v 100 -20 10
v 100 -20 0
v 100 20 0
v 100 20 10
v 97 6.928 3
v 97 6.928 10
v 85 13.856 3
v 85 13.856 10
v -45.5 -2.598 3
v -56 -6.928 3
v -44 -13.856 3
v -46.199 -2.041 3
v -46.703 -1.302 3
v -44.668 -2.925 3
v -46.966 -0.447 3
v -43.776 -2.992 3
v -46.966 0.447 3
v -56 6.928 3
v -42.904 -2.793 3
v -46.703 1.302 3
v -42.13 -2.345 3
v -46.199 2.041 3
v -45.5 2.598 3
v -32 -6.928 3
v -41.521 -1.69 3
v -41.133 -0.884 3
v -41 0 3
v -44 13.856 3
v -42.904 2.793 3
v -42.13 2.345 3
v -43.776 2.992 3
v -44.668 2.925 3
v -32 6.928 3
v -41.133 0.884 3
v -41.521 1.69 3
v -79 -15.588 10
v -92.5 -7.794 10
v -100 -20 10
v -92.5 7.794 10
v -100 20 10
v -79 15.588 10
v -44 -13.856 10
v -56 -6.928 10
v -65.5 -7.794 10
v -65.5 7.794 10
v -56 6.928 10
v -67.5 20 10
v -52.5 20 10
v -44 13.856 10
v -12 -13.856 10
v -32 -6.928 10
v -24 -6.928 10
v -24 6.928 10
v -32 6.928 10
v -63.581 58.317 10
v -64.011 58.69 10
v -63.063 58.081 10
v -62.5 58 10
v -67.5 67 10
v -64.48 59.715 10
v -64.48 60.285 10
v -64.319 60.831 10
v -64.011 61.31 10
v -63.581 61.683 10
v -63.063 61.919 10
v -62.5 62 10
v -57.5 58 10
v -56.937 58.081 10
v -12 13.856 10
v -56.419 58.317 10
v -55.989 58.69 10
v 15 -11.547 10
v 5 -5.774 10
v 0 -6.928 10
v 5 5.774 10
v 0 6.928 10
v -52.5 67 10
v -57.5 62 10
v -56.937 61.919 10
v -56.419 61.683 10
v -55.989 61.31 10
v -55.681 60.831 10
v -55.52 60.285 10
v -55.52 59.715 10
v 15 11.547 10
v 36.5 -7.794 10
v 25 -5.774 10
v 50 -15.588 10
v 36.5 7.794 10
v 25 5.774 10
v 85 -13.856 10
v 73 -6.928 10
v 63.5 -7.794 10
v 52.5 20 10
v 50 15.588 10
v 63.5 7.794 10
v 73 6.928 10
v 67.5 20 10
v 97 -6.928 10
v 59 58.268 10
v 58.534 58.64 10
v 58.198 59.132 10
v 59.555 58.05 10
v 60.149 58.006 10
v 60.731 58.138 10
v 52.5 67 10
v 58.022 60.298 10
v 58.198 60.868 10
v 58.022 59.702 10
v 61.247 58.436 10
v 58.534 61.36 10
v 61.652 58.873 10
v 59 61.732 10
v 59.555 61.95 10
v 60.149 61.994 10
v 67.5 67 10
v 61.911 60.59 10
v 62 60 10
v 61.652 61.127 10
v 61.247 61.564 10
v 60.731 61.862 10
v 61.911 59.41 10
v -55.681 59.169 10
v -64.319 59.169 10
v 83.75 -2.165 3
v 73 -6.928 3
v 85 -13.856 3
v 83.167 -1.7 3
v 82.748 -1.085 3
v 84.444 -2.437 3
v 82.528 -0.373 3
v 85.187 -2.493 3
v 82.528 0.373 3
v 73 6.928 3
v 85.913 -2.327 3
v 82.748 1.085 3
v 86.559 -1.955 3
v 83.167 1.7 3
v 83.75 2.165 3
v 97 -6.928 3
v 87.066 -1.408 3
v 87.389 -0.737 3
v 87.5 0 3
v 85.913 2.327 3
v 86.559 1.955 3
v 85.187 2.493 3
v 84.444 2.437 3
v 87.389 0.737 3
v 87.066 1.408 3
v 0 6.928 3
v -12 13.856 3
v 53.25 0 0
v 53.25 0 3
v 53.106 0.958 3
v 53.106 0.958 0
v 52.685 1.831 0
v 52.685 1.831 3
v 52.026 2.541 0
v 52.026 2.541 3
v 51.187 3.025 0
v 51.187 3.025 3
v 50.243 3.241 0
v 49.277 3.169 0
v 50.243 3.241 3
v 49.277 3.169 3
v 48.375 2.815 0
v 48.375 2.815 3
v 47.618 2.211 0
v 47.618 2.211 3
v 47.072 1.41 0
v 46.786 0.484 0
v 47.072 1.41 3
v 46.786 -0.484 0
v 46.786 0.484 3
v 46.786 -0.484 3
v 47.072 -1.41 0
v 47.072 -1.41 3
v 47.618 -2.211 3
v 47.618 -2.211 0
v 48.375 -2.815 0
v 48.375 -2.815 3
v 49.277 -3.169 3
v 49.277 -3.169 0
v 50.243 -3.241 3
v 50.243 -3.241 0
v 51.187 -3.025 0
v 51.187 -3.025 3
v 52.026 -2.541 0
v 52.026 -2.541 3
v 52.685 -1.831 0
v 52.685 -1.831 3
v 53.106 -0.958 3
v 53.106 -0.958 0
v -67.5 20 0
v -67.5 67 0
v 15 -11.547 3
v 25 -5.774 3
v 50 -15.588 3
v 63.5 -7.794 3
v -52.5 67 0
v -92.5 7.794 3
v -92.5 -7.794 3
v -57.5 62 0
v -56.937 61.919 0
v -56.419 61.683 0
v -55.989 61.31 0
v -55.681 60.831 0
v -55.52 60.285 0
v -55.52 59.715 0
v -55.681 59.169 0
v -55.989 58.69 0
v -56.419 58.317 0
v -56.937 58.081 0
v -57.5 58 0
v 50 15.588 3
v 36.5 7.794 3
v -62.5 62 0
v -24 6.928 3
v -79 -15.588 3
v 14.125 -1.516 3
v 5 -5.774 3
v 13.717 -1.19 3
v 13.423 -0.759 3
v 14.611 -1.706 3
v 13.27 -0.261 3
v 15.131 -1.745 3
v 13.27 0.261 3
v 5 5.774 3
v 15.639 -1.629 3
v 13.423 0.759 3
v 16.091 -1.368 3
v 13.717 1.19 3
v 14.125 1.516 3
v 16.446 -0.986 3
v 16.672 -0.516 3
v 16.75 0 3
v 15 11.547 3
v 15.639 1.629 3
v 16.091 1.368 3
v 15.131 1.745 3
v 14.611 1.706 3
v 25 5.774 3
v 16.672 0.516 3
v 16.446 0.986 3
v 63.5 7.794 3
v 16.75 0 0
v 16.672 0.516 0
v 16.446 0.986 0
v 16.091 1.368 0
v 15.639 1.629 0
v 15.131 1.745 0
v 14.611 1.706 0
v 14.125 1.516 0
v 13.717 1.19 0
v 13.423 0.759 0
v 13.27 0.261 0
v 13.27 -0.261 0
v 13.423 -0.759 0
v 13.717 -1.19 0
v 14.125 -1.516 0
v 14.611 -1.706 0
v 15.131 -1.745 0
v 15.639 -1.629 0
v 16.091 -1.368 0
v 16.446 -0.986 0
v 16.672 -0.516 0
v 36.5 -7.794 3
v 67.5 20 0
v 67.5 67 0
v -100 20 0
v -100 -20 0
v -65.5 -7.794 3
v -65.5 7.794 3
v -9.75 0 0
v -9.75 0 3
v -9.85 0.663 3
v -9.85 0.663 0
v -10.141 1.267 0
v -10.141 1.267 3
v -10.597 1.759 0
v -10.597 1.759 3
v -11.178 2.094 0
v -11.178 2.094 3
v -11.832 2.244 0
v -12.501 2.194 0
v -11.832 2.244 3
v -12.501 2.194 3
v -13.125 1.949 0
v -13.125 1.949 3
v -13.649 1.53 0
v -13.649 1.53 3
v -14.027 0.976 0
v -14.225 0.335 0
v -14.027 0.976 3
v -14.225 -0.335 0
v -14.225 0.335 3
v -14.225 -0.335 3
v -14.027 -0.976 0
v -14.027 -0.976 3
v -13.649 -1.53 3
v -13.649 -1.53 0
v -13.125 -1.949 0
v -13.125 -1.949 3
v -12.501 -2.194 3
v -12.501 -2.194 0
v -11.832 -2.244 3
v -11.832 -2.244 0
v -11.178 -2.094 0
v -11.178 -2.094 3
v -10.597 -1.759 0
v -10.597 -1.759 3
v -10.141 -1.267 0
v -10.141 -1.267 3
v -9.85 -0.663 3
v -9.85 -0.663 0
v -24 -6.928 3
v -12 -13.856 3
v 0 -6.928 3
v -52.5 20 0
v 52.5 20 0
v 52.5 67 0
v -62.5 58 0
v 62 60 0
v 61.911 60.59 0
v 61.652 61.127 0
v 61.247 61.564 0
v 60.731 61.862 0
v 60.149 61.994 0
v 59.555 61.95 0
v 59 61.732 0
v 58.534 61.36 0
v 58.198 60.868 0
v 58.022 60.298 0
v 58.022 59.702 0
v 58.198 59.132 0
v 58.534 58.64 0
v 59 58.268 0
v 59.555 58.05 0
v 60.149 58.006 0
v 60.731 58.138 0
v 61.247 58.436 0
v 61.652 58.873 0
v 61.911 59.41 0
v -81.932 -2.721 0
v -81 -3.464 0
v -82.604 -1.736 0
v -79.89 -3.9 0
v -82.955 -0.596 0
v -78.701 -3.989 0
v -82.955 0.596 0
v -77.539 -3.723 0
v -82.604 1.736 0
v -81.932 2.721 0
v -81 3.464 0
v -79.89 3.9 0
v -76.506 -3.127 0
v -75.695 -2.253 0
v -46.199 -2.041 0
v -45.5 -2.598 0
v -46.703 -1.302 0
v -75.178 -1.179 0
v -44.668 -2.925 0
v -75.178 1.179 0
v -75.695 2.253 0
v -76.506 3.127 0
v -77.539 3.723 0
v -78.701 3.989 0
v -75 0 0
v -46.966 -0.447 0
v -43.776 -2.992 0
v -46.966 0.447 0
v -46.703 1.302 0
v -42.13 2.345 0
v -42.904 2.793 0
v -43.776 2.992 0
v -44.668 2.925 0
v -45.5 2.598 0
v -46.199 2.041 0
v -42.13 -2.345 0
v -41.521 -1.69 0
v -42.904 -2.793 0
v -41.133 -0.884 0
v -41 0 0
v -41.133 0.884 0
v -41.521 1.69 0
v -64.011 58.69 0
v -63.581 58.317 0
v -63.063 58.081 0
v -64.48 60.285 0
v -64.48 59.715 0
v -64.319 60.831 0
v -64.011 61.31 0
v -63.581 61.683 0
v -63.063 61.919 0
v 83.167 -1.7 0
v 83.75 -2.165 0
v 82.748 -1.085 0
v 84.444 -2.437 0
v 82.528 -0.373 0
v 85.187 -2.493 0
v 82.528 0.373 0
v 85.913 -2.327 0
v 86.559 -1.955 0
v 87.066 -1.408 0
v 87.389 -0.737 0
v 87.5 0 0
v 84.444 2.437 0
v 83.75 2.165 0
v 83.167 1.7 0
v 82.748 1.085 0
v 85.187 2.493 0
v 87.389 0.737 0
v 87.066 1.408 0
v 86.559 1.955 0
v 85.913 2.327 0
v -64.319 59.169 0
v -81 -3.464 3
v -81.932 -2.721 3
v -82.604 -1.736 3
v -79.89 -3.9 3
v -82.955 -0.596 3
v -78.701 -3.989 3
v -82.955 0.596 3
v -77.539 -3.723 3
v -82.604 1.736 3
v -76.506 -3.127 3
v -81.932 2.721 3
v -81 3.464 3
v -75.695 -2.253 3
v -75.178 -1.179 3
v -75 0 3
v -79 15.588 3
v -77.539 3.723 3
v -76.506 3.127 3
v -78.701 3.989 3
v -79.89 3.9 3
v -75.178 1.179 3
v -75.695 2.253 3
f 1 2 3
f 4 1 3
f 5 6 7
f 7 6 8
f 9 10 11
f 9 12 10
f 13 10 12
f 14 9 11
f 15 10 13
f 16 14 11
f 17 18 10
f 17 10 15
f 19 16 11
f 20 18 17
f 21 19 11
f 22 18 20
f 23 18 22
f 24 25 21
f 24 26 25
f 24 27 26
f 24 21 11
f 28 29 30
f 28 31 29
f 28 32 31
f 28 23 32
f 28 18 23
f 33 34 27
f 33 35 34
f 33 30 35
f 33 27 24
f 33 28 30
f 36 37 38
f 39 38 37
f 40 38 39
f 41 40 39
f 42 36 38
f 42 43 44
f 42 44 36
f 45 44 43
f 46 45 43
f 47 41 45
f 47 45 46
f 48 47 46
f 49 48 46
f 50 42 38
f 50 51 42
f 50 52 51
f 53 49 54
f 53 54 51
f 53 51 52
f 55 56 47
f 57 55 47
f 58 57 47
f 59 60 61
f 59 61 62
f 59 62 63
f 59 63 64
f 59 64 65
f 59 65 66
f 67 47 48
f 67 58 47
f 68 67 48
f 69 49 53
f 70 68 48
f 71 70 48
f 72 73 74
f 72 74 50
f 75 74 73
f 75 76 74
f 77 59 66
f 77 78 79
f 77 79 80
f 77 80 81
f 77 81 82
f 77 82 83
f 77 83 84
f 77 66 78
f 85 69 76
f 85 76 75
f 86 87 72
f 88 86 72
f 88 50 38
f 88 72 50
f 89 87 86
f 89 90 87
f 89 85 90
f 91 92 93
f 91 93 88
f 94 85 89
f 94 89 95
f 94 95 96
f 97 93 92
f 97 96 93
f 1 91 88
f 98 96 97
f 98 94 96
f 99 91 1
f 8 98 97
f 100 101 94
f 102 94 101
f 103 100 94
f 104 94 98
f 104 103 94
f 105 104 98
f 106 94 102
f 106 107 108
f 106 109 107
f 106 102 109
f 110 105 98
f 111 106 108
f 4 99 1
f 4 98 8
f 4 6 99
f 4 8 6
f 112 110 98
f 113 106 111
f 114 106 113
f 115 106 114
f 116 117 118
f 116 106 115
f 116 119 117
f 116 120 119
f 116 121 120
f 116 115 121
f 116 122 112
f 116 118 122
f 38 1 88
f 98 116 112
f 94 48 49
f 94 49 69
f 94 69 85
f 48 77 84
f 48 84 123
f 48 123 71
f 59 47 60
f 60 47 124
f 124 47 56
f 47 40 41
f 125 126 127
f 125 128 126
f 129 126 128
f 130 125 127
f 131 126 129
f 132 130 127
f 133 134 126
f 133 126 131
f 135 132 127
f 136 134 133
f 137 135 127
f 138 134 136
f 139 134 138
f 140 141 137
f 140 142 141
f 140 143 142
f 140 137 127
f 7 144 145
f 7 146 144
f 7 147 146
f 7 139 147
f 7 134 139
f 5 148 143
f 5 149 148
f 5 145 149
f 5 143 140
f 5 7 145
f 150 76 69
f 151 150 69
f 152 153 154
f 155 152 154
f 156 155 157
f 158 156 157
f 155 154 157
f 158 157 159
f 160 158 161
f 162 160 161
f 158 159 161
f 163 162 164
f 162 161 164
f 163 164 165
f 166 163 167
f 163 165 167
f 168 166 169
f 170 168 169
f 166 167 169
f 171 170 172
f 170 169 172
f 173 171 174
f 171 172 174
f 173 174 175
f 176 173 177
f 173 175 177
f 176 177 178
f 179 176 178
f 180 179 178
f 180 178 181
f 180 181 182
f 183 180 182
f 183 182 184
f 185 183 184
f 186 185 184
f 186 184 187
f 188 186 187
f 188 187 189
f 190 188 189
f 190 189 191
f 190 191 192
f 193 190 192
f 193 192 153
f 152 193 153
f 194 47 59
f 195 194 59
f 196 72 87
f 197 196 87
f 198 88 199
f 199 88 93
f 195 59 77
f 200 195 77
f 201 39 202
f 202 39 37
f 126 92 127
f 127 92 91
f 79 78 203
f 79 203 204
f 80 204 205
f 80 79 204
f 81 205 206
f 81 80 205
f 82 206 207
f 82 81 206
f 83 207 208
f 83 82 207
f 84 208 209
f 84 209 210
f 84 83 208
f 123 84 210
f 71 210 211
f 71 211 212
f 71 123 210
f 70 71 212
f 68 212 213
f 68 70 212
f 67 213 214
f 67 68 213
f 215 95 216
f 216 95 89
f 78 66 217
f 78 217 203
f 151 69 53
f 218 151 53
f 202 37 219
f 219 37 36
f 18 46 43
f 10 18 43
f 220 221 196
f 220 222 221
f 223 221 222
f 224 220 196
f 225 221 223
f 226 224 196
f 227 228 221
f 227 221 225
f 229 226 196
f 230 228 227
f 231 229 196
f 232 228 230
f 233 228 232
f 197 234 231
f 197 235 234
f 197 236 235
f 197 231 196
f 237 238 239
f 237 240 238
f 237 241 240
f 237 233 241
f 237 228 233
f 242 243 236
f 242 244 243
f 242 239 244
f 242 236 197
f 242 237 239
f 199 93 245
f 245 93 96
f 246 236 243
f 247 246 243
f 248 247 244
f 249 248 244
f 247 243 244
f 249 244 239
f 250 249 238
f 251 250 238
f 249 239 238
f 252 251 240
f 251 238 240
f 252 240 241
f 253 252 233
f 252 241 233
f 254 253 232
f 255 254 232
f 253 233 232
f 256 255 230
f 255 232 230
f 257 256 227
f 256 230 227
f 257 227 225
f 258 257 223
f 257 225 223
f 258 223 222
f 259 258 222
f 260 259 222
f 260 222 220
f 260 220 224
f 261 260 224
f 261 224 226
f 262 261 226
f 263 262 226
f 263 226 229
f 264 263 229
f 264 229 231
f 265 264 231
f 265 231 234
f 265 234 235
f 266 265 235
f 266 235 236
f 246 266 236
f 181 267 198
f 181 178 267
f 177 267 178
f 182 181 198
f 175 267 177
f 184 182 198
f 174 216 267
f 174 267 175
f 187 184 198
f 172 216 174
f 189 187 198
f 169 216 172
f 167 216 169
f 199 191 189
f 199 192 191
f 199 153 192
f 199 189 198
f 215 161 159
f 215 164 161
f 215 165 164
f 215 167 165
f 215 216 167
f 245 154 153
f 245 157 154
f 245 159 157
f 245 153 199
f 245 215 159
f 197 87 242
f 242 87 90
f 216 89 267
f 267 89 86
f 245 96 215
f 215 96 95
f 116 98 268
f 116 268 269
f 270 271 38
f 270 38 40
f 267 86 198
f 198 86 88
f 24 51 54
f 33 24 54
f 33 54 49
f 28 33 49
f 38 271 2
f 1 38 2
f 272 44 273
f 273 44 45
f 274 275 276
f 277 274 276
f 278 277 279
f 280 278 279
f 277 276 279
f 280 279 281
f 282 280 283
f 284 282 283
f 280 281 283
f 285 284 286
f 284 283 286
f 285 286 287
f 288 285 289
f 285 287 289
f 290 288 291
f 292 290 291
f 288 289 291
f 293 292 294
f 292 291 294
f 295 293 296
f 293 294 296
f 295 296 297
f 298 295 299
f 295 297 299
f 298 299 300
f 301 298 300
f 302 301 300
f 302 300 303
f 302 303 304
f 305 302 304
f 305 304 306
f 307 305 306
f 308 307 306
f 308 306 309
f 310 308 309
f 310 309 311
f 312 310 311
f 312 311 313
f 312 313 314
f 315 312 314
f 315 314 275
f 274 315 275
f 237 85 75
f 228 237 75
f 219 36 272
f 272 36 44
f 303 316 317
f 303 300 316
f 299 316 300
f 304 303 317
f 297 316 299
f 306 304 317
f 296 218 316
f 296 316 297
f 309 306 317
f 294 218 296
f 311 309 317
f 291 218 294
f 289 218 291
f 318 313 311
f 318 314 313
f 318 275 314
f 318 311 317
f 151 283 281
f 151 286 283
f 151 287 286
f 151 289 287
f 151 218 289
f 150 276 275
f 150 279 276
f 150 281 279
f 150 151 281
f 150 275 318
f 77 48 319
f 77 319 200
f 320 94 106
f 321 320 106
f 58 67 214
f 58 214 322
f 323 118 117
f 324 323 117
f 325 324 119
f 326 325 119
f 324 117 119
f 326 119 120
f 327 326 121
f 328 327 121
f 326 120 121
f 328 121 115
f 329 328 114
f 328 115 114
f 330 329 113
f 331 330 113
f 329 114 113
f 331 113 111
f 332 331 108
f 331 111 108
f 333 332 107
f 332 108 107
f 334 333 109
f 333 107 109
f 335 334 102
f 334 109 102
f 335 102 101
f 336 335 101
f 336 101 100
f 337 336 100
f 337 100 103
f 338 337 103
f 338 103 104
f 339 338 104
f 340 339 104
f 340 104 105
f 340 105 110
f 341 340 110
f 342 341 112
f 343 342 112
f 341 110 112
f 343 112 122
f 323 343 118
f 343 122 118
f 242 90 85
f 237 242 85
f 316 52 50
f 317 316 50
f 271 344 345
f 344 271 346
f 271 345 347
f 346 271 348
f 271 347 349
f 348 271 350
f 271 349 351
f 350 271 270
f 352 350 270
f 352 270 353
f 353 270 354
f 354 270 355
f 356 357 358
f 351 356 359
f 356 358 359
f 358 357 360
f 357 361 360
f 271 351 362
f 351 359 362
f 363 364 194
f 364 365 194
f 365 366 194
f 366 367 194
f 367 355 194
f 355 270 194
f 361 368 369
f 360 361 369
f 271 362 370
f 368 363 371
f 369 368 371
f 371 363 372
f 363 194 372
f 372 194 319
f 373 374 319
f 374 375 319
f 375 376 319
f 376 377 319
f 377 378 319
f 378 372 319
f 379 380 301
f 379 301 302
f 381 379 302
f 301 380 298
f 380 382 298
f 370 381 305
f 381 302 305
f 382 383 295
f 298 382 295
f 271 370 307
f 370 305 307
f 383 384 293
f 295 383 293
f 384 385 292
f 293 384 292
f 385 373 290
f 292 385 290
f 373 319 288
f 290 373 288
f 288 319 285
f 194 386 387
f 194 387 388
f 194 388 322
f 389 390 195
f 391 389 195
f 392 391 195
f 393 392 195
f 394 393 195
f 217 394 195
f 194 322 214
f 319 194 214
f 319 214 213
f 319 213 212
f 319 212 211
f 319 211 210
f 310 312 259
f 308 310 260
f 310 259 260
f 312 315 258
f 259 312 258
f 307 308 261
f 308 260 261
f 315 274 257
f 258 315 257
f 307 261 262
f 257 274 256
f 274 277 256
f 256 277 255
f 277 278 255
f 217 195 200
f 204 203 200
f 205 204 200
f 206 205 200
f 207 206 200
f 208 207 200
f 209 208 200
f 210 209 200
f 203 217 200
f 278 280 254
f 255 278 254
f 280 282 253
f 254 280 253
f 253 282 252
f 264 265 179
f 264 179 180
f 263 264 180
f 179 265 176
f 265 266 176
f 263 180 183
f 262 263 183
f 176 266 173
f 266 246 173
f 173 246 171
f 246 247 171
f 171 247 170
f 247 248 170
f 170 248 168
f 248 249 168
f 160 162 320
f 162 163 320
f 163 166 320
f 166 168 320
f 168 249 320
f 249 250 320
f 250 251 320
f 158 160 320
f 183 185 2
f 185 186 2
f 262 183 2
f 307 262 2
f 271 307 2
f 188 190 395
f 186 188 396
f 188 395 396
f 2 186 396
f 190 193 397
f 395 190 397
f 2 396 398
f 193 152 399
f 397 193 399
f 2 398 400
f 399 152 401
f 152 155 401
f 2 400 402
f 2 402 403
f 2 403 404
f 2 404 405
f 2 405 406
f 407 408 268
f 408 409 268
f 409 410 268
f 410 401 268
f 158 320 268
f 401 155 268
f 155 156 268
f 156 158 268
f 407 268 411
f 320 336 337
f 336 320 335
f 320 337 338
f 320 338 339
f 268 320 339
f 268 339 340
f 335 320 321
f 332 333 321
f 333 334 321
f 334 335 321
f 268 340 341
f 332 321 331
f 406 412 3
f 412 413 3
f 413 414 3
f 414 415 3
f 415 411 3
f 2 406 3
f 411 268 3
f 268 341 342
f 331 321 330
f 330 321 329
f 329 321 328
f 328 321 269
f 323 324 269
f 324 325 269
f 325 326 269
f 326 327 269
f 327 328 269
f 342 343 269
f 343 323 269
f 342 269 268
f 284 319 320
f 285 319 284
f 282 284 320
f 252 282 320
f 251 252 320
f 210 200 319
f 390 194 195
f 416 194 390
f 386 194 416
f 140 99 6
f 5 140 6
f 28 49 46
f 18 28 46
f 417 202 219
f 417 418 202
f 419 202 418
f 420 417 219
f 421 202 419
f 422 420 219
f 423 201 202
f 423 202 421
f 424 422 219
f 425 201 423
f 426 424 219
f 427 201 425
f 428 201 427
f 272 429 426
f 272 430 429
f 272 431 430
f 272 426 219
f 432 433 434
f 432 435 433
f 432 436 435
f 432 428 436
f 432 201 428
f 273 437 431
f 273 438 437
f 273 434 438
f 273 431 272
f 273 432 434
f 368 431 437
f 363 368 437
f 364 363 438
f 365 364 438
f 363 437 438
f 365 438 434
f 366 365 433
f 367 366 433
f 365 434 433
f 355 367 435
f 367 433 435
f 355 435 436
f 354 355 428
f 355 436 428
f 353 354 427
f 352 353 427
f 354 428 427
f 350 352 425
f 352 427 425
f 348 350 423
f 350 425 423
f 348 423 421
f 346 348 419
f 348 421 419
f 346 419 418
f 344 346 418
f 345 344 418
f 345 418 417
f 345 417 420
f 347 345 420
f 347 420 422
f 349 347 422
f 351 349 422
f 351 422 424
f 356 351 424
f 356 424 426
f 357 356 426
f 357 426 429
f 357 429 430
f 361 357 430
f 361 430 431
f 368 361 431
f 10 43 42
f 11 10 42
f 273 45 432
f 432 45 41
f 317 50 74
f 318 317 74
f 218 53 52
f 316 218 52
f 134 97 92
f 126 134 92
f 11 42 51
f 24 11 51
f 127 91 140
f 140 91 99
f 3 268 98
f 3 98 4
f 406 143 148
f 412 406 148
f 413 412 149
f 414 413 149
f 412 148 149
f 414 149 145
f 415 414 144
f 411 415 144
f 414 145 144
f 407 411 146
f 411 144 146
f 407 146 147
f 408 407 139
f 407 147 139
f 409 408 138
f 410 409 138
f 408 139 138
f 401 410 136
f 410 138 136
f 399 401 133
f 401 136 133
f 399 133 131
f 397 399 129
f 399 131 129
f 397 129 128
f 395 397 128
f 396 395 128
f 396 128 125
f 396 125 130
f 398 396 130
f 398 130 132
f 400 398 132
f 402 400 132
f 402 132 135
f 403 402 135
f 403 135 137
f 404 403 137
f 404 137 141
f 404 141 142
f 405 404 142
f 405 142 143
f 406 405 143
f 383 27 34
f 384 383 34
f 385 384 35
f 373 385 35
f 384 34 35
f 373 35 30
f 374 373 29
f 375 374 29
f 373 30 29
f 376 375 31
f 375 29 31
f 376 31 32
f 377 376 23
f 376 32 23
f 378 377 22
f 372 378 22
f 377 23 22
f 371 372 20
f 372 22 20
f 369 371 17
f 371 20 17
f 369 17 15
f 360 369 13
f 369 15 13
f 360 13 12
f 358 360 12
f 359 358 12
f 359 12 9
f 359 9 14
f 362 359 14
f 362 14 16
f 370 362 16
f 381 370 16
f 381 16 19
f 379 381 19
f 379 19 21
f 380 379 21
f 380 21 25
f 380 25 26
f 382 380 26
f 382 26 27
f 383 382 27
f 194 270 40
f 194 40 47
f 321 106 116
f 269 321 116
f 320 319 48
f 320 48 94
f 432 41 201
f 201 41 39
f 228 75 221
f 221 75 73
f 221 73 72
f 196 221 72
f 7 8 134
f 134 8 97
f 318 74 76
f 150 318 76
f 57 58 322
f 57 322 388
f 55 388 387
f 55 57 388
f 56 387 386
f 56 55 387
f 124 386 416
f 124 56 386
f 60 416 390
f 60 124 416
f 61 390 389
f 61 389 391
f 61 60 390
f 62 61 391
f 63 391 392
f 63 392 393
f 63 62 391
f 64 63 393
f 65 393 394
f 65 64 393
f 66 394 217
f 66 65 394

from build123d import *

# Parameters (mm, degrees)
F0_W     = 200
F0_H     = 40
F1_DEPTH = 10
F3_DEPTH = 7
F4_R     = 4
F4_R_2   = 3
F4_R_3   = 2.25
F4_R_4   = 1.75
F4_R_5   = 3.25
F4_R_6   = 2.5
F5_DEPTH = 10.001
F6_W     = 15
F6_H     = 47
F6_R     = 2
F7_DEPTH = 10


with BuildPart() as f1:
    # F0 (on Top) → F1 (new body)
    with BuildSketch(Plane.XY):
        Rectangle(F0_W, F0_H)
    extrude(amount=F1_DEPTH)

    # F2 (on face) → F3 (cut)
    with BuildSketch(Plane.XY.offset(10)):
        Polygon((-92.5, -7.794229), (-79, -15.588457), (-65.5, -7.794229), (-65.5, 7.794229), (-79, 15.588457), (-92.5, 7.794229), align=None)
        Polygon((97, -6.928203), (97, 6.928203), (85, 13.856406), (73, 6.928203), (73, -6.928203), (85, -13.856406), align=None)
        Polygon((-56, 6.928203), (-56, -6.928203), (-44, -13.856406), (-32, -6.928203), (-32, 6.928203), (-44, 13.856406), align=None)
        Polygon((50, -15.588457), (63.5, -7.794229), (63.5, 7.794229), (50, 15.588457), (36.5, 7.794229), (36.5, -7.794229), align=None)
        Polygon((-12, 13.856406), (-24, 6.928203), (-24, -6.928203), (-12, -13.856406), (0, -6.928203), (0, 6.928203), align=None)
        Polygon((25, -5.773503), (25, 5.773503), (15, 11.547005), (5, 5.773503), (5, -5.773503), (15, -11.547005), align=None)
    extrude(amount=-F3_DEPTH, mode=Mode.SUBTRACT)

    # F4 (on face) → F5 (cut, through all)
    with BuildSketch(Plane.XY.offset(10)):
        with Locations((-79, 0)):
            Circle(F4_R)
        with Locations((-44, 0)):
            Circle(F4_R_2)
        with Locations((-12, 0)):
            Circle(F4_R_3)
        with Locations((15, 0)):
            Circle(F4_R_4)
        with Locations((50, 0)):
            Circle(F4_R_5)
        with Locations((85, 0)):
            Circle(F4_R_6)
    extrude(amount=-F5_DEPTH, mode=Mode.SUBTRACT)

    # F6 (on face) → F7 (join, through all)
    with BuildSketch(Plane.XY.offset(10)):
        with Locations((60, 43.5)):
            Rectangle(F6_W, F6_H)
        with Locations((60, 60)):
            Circle(F6_R, mode=Mode.SUBTRACT)
        with Locations((-60, 43.5)):
            Rectangle(F6_W, F6_H)
        with BuildLine():
            ThreePointArc((-57.5, 62), (-55.5, 60), (-57.5, 58))
            Line((-57.5, 58), (-62.5, 58))
            ThreePointArc((-62.5, 58), (-64.5, 60), (-62.5, 62))
            Line((-62.5, 62), (-57.5, 62))
        make_face(mode=Mode.SUBTRACT)
    extrude(amount=-F7_DEPTH)


solid = f1.part
